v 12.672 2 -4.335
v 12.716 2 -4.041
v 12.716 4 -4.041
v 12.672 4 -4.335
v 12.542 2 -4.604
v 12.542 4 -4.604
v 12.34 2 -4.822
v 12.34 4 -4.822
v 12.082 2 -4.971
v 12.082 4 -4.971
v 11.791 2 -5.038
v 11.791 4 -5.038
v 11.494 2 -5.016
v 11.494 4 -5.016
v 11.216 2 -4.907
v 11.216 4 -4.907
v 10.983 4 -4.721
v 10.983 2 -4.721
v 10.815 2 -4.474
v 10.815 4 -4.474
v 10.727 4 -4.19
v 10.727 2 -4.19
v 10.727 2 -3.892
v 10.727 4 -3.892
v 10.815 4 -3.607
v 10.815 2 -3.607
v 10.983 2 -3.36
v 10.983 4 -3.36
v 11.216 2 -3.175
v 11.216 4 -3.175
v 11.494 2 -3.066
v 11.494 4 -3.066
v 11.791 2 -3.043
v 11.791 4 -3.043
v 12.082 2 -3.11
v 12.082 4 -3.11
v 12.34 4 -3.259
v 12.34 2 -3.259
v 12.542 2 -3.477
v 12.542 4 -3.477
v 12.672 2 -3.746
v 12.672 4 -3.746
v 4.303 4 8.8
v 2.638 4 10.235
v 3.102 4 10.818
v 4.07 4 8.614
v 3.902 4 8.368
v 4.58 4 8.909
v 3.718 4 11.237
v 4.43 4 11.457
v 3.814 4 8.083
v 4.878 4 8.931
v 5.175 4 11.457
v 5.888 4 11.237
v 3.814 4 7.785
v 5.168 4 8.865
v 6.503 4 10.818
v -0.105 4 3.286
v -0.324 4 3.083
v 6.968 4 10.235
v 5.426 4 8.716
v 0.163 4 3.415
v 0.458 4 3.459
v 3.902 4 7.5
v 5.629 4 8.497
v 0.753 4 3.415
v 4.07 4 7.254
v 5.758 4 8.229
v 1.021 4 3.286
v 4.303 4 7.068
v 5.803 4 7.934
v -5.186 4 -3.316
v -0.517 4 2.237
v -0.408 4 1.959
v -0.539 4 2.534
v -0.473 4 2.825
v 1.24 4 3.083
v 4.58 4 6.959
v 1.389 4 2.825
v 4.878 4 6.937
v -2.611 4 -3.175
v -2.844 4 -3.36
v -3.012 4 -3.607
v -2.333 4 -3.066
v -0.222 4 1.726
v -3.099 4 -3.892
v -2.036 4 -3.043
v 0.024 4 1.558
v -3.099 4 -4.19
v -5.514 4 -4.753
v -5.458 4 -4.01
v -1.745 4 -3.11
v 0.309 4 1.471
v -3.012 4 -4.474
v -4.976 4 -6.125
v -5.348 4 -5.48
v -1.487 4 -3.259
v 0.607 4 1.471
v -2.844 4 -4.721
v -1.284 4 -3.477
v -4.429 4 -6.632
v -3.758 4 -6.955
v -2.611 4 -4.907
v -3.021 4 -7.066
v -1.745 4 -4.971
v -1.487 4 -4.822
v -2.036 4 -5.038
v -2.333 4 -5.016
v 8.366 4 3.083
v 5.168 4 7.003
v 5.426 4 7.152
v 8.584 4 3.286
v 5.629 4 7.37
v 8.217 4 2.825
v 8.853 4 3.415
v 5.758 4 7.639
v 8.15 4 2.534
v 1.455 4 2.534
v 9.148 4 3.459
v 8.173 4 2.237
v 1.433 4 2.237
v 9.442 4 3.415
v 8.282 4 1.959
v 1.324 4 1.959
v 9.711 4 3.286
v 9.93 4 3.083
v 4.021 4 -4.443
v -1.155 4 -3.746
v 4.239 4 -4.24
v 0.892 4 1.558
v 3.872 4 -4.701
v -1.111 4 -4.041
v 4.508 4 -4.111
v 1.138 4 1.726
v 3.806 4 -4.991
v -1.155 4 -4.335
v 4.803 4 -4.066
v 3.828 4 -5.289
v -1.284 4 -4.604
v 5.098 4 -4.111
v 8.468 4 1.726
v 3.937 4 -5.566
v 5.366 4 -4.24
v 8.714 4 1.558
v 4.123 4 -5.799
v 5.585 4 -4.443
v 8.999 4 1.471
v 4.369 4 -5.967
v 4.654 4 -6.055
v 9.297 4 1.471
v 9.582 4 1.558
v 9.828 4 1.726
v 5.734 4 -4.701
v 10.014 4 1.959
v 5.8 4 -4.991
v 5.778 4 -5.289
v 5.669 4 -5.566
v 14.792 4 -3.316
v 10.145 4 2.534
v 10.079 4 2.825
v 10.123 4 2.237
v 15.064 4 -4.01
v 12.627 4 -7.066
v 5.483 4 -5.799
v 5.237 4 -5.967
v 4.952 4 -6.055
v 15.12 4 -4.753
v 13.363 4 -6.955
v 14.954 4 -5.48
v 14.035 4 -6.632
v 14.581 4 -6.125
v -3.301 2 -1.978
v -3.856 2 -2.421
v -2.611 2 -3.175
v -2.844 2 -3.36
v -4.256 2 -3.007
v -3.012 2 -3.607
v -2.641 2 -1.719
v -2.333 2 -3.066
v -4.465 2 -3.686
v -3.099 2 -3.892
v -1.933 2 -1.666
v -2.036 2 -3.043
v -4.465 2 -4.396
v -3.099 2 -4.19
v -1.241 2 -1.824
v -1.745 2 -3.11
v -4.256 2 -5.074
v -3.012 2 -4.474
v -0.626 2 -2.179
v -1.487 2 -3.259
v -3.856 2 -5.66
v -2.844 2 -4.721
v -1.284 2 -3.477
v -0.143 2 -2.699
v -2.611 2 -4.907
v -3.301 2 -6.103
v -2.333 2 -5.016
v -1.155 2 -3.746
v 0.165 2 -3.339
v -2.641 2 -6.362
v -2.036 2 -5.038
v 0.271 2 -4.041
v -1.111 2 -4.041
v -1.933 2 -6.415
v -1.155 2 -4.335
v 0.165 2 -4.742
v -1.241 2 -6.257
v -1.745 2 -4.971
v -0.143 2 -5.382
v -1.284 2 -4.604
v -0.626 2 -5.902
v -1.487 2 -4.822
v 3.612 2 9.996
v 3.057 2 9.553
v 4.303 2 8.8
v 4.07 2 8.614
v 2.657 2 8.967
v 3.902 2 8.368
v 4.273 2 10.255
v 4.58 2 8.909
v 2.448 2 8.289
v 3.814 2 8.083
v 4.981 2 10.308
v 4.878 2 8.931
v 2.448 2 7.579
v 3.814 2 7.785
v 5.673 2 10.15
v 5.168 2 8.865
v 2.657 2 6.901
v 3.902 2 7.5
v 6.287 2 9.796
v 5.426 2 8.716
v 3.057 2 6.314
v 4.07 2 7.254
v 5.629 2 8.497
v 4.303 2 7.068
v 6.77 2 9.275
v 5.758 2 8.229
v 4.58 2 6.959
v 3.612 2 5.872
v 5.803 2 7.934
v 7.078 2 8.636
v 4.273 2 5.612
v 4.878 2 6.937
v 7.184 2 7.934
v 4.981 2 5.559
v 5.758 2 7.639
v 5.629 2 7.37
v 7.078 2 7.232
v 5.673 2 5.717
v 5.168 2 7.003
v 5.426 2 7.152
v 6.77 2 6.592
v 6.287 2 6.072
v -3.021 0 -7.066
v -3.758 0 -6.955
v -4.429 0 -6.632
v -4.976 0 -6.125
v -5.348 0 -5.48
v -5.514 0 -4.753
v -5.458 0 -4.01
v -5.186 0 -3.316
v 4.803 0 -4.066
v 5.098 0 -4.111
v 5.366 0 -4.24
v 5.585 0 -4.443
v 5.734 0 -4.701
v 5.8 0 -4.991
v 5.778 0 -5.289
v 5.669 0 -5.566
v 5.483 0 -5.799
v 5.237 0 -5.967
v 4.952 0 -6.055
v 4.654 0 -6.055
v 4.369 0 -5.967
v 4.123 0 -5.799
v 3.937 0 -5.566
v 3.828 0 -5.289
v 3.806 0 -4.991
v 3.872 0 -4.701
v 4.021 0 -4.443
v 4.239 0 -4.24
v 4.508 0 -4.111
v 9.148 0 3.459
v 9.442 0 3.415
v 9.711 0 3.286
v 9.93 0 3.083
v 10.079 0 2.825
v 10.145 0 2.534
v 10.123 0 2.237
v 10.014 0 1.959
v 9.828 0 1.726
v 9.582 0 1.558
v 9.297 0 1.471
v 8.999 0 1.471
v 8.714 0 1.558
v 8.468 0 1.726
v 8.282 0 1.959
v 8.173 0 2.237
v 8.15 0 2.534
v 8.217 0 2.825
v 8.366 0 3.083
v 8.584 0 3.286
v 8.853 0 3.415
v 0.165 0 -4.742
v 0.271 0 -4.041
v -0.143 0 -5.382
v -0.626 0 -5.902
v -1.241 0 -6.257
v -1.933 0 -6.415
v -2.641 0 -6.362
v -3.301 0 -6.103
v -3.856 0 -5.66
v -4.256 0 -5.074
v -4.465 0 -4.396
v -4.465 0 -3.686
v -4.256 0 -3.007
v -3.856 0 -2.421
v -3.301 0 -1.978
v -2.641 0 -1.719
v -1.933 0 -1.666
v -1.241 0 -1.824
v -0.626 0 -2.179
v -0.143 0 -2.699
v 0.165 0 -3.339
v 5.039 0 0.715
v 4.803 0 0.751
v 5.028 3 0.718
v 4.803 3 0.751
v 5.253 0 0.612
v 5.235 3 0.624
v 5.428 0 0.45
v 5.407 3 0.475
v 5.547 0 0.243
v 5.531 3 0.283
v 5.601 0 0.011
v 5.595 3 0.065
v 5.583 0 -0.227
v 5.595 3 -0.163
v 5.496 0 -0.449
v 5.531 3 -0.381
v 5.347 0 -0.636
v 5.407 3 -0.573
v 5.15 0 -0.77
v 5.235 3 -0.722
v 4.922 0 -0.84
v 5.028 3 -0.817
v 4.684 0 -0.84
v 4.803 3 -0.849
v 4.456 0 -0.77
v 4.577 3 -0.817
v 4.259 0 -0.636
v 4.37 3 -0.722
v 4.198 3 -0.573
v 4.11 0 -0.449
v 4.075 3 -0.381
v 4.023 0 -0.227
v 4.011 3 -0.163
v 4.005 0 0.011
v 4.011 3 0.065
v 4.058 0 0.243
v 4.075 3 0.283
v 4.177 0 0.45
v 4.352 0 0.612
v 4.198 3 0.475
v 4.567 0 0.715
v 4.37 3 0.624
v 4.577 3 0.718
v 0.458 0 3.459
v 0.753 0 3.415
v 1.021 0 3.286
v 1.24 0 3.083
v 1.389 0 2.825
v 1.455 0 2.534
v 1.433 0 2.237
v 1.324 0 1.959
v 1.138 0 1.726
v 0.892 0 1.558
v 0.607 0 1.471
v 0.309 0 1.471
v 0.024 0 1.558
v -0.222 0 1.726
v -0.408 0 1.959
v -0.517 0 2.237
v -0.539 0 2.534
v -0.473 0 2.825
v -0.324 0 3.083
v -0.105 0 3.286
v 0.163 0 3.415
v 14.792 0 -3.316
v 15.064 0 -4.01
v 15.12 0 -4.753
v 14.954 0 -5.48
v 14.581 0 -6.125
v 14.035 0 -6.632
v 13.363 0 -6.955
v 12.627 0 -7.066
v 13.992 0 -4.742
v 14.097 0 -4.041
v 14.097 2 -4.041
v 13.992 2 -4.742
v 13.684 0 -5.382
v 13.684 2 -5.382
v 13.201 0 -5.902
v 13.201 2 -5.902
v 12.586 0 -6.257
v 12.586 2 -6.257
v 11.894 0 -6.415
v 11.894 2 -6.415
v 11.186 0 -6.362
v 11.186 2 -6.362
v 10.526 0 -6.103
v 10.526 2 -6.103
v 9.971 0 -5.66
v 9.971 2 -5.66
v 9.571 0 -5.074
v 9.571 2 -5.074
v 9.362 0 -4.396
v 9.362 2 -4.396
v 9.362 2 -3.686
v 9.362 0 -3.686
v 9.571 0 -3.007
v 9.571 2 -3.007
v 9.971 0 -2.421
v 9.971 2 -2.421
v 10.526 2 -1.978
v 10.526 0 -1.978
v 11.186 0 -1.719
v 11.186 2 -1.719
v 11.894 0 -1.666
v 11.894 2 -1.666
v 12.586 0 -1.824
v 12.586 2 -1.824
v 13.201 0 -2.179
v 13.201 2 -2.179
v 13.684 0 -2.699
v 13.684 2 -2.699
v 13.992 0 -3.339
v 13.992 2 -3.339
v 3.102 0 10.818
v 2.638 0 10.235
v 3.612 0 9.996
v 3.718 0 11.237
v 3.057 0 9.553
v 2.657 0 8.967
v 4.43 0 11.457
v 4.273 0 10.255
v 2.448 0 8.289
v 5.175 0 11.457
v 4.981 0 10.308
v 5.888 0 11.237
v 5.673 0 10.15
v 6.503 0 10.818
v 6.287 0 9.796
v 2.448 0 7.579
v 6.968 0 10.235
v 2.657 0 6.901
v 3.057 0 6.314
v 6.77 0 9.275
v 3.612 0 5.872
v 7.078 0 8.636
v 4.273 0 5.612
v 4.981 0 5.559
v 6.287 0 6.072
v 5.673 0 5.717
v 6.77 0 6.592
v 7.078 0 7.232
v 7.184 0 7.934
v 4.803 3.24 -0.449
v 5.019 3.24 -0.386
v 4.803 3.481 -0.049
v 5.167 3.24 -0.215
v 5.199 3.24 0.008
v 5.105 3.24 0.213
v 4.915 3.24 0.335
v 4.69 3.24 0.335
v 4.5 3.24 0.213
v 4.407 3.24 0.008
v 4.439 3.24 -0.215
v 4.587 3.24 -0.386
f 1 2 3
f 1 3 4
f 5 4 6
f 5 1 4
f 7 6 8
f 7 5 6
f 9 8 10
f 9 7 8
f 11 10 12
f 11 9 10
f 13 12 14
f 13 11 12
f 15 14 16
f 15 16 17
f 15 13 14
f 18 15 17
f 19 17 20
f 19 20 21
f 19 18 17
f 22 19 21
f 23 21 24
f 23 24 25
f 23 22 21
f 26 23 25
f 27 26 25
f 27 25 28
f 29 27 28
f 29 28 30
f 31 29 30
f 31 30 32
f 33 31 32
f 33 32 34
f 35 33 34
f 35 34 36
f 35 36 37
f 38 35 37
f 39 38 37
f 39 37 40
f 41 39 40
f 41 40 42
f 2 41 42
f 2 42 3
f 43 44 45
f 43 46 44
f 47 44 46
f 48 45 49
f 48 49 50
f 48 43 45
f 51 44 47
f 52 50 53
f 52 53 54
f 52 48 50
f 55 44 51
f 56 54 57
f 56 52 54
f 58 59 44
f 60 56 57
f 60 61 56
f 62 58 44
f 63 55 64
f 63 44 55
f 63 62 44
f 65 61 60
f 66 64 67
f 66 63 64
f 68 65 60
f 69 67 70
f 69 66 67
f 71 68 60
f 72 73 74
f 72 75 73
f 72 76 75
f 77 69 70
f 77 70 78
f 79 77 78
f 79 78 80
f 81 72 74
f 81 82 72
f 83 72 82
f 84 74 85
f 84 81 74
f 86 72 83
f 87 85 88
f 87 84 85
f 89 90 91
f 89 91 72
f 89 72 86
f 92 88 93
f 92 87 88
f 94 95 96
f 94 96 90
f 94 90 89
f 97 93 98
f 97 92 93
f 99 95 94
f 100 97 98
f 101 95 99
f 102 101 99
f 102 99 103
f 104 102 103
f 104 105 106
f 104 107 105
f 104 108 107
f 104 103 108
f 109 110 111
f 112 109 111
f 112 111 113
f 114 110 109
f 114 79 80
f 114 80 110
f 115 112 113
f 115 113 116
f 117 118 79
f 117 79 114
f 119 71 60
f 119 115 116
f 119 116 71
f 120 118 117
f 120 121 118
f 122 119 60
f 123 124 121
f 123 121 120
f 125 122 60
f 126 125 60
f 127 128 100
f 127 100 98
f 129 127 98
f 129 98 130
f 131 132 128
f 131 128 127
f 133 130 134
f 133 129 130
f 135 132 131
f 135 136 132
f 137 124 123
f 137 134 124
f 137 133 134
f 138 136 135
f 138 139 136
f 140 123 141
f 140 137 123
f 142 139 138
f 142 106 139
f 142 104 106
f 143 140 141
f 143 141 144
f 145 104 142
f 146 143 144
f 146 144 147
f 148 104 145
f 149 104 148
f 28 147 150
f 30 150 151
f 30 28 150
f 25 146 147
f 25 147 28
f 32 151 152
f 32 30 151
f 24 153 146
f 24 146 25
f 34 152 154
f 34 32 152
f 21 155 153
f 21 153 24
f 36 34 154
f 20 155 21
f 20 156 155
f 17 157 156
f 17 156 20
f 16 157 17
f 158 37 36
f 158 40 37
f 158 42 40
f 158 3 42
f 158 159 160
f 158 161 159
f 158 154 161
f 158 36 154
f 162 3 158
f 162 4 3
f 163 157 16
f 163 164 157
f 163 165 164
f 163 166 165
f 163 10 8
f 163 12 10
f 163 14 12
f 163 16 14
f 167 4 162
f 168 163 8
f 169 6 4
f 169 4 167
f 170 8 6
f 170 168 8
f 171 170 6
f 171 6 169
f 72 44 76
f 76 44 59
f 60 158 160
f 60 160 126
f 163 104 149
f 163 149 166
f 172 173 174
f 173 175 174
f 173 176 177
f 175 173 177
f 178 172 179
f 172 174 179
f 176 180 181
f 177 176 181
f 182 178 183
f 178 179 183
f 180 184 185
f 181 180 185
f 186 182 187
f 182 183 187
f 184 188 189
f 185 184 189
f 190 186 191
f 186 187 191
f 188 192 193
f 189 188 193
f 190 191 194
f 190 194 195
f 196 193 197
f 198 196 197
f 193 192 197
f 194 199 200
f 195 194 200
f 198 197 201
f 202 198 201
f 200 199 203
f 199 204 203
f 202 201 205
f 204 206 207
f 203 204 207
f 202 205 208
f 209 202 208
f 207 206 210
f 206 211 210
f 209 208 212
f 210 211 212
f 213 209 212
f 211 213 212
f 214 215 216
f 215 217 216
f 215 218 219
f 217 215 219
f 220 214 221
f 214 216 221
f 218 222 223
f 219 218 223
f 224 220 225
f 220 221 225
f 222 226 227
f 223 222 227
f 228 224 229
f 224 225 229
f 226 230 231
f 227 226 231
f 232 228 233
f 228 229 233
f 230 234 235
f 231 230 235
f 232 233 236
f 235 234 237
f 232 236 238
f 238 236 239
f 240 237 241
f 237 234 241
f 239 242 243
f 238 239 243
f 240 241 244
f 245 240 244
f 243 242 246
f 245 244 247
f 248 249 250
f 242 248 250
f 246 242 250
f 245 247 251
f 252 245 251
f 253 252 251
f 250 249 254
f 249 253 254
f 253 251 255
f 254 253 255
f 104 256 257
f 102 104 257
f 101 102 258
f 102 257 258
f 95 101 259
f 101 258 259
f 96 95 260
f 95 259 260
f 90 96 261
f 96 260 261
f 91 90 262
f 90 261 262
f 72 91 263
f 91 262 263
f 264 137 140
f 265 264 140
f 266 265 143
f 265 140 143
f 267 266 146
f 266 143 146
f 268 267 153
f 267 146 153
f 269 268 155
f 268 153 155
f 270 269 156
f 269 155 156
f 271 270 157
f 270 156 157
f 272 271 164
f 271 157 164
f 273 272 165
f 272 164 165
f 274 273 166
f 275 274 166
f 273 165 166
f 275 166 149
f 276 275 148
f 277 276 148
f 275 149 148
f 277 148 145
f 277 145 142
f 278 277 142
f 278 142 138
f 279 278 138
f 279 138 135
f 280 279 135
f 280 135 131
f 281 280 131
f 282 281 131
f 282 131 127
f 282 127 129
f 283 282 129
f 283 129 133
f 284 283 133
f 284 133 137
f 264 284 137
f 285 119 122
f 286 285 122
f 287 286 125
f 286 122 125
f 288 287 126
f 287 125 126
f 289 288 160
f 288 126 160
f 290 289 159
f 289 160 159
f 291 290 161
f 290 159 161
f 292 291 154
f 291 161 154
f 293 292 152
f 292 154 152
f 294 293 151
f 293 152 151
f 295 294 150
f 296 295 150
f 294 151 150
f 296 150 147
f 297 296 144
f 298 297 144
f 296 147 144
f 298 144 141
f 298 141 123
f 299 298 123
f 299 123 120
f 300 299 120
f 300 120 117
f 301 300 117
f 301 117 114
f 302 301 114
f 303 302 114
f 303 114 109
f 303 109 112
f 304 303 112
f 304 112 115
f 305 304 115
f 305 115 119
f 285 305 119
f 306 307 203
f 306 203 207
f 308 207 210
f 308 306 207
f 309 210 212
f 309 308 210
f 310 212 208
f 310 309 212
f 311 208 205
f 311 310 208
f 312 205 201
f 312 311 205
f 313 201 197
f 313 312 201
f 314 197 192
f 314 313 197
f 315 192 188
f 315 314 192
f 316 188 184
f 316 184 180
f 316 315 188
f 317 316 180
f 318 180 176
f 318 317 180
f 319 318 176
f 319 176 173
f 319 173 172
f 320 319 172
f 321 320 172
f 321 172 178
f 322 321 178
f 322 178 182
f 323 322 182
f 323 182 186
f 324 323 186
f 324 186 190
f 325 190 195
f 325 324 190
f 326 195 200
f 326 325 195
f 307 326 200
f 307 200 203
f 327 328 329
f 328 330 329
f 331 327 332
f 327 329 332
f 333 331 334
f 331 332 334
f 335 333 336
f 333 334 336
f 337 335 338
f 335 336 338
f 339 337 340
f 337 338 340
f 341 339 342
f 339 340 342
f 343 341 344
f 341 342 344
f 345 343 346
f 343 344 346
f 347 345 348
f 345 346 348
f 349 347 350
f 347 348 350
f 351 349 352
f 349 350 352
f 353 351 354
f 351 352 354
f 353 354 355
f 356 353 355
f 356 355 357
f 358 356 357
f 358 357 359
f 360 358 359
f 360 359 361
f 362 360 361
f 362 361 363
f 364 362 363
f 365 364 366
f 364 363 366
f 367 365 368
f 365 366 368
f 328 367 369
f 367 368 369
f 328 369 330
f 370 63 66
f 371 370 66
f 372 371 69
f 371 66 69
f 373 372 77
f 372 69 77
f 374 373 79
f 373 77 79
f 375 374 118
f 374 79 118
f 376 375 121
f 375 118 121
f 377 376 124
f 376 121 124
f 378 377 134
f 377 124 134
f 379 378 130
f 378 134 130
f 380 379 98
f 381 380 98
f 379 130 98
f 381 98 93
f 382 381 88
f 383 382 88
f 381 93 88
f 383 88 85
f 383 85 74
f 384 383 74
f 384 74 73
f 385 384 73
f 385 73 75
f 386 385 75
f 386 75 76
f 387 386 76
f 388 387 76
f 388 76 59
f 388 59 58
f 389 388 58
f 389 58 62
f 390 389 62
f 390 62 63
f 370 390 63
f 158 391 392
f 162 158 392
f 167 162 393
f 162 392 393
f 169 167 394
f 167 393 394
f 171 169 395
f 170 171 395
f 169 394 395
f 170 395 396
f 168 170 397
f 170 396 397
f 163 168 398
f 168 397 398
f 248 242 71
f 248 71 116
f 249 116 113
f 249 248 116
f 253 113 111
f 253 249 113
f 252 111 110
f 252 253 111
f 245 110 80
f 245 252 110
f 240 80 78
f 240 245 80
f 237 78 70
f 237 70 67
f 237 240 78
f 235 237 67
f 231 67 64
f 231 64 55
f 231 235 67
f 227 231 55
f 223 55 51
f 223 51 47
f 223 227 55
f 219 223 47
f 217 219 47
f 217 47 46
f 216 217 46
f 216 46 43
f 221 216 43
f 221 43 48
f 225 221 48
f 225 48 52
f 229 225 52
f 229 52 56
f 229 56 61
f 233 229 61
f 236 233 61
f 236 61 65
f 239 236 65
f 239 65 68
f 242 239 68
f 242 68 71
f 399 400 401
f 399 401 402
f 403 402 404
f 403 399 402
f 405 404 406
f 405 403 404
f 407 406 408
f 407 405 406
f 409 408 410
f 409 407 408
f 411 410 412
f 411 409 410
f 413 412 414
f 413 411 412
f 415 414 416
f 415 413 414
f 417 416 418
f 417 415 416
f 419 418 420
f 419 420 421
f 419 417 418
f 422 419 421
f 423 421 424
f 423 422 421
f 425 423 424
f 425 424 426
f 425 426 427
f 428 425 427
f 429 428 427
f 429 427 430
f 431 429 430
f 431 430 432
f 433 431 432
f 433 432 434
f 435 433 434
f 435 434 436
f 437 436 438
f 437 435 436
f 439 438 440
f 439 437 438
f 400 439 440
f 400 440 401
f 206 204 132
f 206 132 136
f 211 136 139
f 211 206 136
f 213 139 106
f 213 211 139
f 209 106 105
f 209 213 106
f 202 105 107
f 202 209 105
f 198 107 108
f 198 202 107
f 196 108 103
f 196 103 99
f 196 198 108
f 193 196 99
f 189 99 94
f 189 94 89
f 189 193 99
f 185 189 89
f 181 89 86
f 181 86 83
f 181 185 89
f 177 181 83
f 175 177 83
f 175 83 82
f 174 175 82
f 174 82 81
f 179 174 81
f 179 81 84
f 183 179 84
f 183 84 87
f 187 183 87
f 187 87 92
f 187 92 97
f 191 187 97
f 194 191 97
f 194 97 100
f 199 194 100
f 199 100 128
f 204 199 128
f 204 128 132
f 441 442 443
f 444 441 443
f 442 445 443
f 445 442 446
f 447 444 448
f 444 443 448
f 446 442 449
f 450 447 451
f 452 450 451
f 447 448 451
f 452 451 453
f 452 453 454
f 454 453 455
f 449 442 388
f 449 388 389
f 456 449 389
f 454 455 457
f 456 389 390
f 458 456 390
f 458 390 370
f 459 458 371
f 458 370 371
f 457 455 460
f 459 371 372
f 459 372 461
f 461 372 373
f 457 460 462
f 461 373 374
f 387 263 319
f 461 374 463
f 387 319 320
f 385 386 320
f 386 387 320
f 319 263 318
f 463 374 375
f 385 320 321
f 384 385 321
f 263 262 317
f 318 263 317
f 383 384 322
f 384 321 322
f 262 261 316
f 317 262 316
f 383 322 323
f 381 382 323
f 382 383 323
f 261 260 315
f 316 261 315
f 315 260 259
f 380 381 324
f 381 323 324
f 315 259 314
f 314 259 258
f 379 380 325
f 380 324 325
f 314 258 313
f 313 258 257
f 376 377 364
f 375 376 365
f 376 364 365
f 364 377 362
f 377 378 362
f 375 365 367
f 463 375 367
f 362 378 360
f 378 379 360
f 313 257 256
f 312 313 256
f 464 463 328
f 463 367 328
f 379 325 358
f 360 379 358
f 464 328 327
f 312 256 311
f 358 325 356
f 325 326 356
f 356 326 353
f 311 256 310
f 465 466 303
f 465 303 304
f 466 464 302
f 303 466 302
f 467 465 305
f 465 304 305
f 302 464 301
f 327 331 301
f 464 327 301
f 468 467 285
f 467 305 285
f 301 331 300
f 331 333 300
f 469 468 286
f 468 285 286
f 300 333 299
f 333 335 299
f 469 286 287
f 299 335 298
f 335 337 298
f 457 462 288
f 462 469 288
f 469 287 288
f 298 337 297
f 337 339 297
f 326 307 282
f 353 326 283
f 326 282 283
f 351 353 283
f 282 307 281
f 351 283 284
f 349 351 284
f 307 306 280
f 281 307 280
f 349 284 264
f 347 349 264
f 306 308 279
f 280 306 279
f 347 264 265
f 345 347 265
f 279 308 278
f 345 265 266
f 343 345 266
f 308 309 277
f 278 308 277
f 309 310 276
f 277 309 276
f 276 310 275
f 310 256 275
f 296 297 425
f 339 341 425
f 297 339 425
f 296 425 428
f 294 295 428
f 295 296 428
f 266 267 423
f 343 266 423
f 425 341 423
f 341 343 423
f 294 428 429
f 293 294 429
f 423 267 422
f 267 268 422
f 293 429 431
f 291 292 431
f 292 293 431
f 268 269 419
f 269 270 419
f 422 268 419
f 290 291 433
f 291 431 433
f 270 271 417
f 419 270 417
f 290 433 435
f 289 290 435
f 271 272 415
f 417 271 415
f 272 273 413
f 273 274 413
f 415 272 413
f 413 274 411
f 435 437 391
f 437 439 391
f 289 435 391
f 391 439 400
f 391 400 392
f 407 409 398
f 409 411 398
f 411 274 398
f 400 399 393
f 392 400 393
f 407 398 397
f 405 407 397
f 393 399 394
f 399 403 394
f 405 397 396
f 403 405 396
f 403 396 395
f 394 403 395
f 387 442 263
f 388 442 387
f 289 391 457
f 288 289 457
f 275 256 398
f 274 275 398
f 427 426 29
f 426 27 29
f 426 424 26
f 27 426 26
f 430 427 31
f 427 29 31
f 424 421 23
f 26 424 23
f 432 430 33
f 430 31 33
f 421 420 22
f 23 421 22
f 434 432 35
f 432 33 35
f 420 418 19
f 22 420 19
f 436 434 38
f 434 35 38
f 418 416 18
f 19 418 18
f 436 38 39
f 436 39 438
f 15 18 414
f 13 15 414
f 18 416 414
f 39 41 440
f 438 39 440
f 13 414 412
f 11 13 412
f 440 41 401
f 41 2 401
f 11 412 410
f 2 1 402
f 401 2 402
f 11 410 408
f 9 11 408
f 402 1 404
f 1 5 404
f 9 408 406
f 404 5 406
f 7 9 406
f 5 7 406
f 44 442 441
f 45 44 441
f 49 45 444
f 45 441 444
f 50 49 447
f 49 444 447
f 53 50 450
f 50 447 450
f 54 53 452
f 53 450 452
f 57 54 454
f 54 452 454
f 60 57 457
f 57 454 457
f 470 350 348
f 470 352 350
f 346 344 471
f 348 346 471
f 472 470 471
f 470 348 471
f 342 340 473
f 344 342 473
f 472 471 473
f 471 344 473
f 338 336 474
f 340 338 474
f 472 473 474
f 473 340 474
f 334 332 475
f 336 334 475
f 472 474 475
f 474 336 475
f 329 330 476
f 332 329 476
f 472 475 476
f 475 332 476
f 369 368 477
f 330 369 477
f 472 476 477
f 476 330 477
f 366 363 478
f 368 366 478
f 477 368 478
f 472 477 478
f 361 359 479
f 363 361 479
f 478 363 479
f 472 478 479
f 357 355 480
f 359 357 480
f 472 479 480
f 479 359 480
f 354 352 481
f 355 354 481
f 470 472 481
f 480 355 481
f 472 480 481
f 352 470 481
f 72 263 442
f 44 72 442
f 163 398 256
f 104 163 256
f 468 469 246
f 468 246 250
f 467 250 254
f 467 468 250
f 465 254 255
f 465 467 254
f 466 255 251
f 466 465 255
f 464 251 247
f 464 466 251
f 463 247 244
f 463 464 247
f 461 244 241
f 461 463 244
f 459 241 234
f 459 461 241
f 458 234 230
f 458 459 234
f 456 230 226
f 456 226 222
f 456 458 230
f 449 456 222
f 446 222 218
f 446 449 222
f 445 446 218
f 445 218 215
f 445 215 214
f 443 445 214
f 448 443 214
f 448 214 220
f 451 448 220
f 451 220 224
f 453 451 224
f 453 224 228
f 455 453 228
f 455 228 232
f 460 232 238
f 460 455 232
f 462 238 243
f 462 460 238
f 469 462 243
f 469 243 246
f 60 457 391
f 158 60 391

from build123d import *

# Parameters (mm, degrees)
SKETCH1_R                    = 1
EXTRUDE1_DEPTH               = 4
SKETCH1_3_R                  = 2.38125
SKETCH1_3_R_2                = 1
EXTRUDE4_DEPTH               = 2
M2X0_4_TAPPED_HOLE1_D        = 1.6
M2X0_4_TAPPED_HOLE1_DEPTH    = 3
M2X0_4_TAPPED_HOLE1_TIP      = 0.480688495
F_2_0_2_DIAMETER_HOLE1_D     = 2
F_2_0_2_DIAMETER_HOLE1_DEPTH = 10
F_2_0_2_DIAMETER_HOLE1_TIP   = 0.600860619


with BuildPart() as part:
    # Sketch1 → Extrude1 (new body)
    with BuildSketch(Plane(origin=(0, 0, 0), x_dir=(1, 0, 0), z_dir=(0, 1, 0))):
        with BuildLine():
            ThreePointArc((-3.020977638, 7.066192399), (-5.186041147, 5.816192399), (-5.186041147, 3.316192399))
            Line((-5.186041147, 3.316192399), (2.637731834, -10.234979911))
            ThreePointArc((2.637731834, -10.234979911), (4.802795343, -11.484979911), (6.967858853, -10.234979911))
            Line((6.967858853, -10.234979911), (14.791631834, 3.316192399))
            ThreePointArc((14.791631834, 3.316192399), (14.791631834, 5.816192399), (12.626568324, 7.066192399))
            Line((12.626568324, 7.066192399), (-3.020977638, 7.066192399))
        make_face()
        with Locations((4.802795343, -7.933807601)):
            Circle(SKETCH1_R, mode=Mode.SUBTRACT)
        with Locations((-2.110635714, 4.040606244)):
            Circle(SKETCH1_R, mode=Mode.SUBTRACT)
        with Locations((11.7162264, 4.040606244)):
            Circle(SKETCH1_R, mode=Mode.SUBTRACT)
    extrude(amount=EXTRUDE1_DEPTH)

    # Sketch1<3> → Extrude4 (cut)
    # profile 1 of 3: a face of its own
    with BuildSketch(Plane(origin=(0, 0, 0), x_dir=(1, 0, 0), z_dir=(0, 1, 0))):
        with Locations((-2.110635714, 4.040606244)):
            Circle(SKETCH1_3_R)
    # profile 2 of 3: a face of its own
    with BuildSketch(Plane(origin=(0, 0, 0), x_dir=(1, 0, 0), z_dir=(0, 1, 0))):
        with Locations((4.802795343, -7.933807601)):
            Circle(SKETCH1_3_R)
        with Locations((4.802795343, -7.933807601)):
            Circle(SKETCH1_3_R_2, mode=Mode.SUBTRACT)
    # profile 3 of 3: a face of its own
    with BuildSketch(Plane(origin=(0, 0, 0), x_dir=(1, 0, 0), z_dir=(0, 1, 0))):
        with Locations((11.7162264, 4.040606244)):
            Circle(SKETCH1_3_R)
        with Locations((11.7162264, 4.040606244)):
            Circle(SKETCH1_3_R_2, mode=Mode.SUBTRACT)
    extrude(amount=EXTRUDE4_DEPTH, mode=Mode.SUBTRACT)

    # M2x0.4 Tapped Hole1
    with Locations(Plane(origin=(4.802795343, 0, -0.049134963), x_dir=(0, 0, -1), z_dir=(0, -1, 0))):
        with Locations((0, 0)):
            Hole(M2X0_4_TAPPED_HOLE1_D / 2, depth=M2X0_4_TAPPED_HOLE1_DEPTH)
            with Locations((0, 0, -(M2X0_4_TAPPED_HOLE1_DEPTH + M2X0_4_TAPPED_HOLE1_TIP / 2))):  # 118° drill point
                Cone(0, M2X0_4_TAPPED_HOLE1_D / 2, M2X0_4_TAPPED_HOLE1_TIP, mode=Mode.SUBTRACT)

    # Ø2.0 (2) Diameter Hole1
    with Locations(Plane(origin=(0.457896151, 0, 2.459393756), x_dir=(0, 0, -1), z_dir=(0, -1, 0))):
        with Locations((0, 0), (0, 8.689798385), (7.525586155, 4.344899192)):
            Hole(F_2_0_2_DIAMETER_HOLE1_D / 2, depth=F_2_0_2_DIAMETER_HOLE1_DEPTH)
            with Locations((0, 0, -(F_2_0_2_DIAMETER_HOLE1_DEPTH + F_2_0_2_DIAMETER_HOLE1_TIP / 2))):  # 118° drill point
                Cone(0, F_2_0_2_DIAMETER_HOLE1_D / 2, F_2_0_2_DIAMETER_HOLE1_TIP, mode=Mode.SUBTRACT)


solid = part.part
